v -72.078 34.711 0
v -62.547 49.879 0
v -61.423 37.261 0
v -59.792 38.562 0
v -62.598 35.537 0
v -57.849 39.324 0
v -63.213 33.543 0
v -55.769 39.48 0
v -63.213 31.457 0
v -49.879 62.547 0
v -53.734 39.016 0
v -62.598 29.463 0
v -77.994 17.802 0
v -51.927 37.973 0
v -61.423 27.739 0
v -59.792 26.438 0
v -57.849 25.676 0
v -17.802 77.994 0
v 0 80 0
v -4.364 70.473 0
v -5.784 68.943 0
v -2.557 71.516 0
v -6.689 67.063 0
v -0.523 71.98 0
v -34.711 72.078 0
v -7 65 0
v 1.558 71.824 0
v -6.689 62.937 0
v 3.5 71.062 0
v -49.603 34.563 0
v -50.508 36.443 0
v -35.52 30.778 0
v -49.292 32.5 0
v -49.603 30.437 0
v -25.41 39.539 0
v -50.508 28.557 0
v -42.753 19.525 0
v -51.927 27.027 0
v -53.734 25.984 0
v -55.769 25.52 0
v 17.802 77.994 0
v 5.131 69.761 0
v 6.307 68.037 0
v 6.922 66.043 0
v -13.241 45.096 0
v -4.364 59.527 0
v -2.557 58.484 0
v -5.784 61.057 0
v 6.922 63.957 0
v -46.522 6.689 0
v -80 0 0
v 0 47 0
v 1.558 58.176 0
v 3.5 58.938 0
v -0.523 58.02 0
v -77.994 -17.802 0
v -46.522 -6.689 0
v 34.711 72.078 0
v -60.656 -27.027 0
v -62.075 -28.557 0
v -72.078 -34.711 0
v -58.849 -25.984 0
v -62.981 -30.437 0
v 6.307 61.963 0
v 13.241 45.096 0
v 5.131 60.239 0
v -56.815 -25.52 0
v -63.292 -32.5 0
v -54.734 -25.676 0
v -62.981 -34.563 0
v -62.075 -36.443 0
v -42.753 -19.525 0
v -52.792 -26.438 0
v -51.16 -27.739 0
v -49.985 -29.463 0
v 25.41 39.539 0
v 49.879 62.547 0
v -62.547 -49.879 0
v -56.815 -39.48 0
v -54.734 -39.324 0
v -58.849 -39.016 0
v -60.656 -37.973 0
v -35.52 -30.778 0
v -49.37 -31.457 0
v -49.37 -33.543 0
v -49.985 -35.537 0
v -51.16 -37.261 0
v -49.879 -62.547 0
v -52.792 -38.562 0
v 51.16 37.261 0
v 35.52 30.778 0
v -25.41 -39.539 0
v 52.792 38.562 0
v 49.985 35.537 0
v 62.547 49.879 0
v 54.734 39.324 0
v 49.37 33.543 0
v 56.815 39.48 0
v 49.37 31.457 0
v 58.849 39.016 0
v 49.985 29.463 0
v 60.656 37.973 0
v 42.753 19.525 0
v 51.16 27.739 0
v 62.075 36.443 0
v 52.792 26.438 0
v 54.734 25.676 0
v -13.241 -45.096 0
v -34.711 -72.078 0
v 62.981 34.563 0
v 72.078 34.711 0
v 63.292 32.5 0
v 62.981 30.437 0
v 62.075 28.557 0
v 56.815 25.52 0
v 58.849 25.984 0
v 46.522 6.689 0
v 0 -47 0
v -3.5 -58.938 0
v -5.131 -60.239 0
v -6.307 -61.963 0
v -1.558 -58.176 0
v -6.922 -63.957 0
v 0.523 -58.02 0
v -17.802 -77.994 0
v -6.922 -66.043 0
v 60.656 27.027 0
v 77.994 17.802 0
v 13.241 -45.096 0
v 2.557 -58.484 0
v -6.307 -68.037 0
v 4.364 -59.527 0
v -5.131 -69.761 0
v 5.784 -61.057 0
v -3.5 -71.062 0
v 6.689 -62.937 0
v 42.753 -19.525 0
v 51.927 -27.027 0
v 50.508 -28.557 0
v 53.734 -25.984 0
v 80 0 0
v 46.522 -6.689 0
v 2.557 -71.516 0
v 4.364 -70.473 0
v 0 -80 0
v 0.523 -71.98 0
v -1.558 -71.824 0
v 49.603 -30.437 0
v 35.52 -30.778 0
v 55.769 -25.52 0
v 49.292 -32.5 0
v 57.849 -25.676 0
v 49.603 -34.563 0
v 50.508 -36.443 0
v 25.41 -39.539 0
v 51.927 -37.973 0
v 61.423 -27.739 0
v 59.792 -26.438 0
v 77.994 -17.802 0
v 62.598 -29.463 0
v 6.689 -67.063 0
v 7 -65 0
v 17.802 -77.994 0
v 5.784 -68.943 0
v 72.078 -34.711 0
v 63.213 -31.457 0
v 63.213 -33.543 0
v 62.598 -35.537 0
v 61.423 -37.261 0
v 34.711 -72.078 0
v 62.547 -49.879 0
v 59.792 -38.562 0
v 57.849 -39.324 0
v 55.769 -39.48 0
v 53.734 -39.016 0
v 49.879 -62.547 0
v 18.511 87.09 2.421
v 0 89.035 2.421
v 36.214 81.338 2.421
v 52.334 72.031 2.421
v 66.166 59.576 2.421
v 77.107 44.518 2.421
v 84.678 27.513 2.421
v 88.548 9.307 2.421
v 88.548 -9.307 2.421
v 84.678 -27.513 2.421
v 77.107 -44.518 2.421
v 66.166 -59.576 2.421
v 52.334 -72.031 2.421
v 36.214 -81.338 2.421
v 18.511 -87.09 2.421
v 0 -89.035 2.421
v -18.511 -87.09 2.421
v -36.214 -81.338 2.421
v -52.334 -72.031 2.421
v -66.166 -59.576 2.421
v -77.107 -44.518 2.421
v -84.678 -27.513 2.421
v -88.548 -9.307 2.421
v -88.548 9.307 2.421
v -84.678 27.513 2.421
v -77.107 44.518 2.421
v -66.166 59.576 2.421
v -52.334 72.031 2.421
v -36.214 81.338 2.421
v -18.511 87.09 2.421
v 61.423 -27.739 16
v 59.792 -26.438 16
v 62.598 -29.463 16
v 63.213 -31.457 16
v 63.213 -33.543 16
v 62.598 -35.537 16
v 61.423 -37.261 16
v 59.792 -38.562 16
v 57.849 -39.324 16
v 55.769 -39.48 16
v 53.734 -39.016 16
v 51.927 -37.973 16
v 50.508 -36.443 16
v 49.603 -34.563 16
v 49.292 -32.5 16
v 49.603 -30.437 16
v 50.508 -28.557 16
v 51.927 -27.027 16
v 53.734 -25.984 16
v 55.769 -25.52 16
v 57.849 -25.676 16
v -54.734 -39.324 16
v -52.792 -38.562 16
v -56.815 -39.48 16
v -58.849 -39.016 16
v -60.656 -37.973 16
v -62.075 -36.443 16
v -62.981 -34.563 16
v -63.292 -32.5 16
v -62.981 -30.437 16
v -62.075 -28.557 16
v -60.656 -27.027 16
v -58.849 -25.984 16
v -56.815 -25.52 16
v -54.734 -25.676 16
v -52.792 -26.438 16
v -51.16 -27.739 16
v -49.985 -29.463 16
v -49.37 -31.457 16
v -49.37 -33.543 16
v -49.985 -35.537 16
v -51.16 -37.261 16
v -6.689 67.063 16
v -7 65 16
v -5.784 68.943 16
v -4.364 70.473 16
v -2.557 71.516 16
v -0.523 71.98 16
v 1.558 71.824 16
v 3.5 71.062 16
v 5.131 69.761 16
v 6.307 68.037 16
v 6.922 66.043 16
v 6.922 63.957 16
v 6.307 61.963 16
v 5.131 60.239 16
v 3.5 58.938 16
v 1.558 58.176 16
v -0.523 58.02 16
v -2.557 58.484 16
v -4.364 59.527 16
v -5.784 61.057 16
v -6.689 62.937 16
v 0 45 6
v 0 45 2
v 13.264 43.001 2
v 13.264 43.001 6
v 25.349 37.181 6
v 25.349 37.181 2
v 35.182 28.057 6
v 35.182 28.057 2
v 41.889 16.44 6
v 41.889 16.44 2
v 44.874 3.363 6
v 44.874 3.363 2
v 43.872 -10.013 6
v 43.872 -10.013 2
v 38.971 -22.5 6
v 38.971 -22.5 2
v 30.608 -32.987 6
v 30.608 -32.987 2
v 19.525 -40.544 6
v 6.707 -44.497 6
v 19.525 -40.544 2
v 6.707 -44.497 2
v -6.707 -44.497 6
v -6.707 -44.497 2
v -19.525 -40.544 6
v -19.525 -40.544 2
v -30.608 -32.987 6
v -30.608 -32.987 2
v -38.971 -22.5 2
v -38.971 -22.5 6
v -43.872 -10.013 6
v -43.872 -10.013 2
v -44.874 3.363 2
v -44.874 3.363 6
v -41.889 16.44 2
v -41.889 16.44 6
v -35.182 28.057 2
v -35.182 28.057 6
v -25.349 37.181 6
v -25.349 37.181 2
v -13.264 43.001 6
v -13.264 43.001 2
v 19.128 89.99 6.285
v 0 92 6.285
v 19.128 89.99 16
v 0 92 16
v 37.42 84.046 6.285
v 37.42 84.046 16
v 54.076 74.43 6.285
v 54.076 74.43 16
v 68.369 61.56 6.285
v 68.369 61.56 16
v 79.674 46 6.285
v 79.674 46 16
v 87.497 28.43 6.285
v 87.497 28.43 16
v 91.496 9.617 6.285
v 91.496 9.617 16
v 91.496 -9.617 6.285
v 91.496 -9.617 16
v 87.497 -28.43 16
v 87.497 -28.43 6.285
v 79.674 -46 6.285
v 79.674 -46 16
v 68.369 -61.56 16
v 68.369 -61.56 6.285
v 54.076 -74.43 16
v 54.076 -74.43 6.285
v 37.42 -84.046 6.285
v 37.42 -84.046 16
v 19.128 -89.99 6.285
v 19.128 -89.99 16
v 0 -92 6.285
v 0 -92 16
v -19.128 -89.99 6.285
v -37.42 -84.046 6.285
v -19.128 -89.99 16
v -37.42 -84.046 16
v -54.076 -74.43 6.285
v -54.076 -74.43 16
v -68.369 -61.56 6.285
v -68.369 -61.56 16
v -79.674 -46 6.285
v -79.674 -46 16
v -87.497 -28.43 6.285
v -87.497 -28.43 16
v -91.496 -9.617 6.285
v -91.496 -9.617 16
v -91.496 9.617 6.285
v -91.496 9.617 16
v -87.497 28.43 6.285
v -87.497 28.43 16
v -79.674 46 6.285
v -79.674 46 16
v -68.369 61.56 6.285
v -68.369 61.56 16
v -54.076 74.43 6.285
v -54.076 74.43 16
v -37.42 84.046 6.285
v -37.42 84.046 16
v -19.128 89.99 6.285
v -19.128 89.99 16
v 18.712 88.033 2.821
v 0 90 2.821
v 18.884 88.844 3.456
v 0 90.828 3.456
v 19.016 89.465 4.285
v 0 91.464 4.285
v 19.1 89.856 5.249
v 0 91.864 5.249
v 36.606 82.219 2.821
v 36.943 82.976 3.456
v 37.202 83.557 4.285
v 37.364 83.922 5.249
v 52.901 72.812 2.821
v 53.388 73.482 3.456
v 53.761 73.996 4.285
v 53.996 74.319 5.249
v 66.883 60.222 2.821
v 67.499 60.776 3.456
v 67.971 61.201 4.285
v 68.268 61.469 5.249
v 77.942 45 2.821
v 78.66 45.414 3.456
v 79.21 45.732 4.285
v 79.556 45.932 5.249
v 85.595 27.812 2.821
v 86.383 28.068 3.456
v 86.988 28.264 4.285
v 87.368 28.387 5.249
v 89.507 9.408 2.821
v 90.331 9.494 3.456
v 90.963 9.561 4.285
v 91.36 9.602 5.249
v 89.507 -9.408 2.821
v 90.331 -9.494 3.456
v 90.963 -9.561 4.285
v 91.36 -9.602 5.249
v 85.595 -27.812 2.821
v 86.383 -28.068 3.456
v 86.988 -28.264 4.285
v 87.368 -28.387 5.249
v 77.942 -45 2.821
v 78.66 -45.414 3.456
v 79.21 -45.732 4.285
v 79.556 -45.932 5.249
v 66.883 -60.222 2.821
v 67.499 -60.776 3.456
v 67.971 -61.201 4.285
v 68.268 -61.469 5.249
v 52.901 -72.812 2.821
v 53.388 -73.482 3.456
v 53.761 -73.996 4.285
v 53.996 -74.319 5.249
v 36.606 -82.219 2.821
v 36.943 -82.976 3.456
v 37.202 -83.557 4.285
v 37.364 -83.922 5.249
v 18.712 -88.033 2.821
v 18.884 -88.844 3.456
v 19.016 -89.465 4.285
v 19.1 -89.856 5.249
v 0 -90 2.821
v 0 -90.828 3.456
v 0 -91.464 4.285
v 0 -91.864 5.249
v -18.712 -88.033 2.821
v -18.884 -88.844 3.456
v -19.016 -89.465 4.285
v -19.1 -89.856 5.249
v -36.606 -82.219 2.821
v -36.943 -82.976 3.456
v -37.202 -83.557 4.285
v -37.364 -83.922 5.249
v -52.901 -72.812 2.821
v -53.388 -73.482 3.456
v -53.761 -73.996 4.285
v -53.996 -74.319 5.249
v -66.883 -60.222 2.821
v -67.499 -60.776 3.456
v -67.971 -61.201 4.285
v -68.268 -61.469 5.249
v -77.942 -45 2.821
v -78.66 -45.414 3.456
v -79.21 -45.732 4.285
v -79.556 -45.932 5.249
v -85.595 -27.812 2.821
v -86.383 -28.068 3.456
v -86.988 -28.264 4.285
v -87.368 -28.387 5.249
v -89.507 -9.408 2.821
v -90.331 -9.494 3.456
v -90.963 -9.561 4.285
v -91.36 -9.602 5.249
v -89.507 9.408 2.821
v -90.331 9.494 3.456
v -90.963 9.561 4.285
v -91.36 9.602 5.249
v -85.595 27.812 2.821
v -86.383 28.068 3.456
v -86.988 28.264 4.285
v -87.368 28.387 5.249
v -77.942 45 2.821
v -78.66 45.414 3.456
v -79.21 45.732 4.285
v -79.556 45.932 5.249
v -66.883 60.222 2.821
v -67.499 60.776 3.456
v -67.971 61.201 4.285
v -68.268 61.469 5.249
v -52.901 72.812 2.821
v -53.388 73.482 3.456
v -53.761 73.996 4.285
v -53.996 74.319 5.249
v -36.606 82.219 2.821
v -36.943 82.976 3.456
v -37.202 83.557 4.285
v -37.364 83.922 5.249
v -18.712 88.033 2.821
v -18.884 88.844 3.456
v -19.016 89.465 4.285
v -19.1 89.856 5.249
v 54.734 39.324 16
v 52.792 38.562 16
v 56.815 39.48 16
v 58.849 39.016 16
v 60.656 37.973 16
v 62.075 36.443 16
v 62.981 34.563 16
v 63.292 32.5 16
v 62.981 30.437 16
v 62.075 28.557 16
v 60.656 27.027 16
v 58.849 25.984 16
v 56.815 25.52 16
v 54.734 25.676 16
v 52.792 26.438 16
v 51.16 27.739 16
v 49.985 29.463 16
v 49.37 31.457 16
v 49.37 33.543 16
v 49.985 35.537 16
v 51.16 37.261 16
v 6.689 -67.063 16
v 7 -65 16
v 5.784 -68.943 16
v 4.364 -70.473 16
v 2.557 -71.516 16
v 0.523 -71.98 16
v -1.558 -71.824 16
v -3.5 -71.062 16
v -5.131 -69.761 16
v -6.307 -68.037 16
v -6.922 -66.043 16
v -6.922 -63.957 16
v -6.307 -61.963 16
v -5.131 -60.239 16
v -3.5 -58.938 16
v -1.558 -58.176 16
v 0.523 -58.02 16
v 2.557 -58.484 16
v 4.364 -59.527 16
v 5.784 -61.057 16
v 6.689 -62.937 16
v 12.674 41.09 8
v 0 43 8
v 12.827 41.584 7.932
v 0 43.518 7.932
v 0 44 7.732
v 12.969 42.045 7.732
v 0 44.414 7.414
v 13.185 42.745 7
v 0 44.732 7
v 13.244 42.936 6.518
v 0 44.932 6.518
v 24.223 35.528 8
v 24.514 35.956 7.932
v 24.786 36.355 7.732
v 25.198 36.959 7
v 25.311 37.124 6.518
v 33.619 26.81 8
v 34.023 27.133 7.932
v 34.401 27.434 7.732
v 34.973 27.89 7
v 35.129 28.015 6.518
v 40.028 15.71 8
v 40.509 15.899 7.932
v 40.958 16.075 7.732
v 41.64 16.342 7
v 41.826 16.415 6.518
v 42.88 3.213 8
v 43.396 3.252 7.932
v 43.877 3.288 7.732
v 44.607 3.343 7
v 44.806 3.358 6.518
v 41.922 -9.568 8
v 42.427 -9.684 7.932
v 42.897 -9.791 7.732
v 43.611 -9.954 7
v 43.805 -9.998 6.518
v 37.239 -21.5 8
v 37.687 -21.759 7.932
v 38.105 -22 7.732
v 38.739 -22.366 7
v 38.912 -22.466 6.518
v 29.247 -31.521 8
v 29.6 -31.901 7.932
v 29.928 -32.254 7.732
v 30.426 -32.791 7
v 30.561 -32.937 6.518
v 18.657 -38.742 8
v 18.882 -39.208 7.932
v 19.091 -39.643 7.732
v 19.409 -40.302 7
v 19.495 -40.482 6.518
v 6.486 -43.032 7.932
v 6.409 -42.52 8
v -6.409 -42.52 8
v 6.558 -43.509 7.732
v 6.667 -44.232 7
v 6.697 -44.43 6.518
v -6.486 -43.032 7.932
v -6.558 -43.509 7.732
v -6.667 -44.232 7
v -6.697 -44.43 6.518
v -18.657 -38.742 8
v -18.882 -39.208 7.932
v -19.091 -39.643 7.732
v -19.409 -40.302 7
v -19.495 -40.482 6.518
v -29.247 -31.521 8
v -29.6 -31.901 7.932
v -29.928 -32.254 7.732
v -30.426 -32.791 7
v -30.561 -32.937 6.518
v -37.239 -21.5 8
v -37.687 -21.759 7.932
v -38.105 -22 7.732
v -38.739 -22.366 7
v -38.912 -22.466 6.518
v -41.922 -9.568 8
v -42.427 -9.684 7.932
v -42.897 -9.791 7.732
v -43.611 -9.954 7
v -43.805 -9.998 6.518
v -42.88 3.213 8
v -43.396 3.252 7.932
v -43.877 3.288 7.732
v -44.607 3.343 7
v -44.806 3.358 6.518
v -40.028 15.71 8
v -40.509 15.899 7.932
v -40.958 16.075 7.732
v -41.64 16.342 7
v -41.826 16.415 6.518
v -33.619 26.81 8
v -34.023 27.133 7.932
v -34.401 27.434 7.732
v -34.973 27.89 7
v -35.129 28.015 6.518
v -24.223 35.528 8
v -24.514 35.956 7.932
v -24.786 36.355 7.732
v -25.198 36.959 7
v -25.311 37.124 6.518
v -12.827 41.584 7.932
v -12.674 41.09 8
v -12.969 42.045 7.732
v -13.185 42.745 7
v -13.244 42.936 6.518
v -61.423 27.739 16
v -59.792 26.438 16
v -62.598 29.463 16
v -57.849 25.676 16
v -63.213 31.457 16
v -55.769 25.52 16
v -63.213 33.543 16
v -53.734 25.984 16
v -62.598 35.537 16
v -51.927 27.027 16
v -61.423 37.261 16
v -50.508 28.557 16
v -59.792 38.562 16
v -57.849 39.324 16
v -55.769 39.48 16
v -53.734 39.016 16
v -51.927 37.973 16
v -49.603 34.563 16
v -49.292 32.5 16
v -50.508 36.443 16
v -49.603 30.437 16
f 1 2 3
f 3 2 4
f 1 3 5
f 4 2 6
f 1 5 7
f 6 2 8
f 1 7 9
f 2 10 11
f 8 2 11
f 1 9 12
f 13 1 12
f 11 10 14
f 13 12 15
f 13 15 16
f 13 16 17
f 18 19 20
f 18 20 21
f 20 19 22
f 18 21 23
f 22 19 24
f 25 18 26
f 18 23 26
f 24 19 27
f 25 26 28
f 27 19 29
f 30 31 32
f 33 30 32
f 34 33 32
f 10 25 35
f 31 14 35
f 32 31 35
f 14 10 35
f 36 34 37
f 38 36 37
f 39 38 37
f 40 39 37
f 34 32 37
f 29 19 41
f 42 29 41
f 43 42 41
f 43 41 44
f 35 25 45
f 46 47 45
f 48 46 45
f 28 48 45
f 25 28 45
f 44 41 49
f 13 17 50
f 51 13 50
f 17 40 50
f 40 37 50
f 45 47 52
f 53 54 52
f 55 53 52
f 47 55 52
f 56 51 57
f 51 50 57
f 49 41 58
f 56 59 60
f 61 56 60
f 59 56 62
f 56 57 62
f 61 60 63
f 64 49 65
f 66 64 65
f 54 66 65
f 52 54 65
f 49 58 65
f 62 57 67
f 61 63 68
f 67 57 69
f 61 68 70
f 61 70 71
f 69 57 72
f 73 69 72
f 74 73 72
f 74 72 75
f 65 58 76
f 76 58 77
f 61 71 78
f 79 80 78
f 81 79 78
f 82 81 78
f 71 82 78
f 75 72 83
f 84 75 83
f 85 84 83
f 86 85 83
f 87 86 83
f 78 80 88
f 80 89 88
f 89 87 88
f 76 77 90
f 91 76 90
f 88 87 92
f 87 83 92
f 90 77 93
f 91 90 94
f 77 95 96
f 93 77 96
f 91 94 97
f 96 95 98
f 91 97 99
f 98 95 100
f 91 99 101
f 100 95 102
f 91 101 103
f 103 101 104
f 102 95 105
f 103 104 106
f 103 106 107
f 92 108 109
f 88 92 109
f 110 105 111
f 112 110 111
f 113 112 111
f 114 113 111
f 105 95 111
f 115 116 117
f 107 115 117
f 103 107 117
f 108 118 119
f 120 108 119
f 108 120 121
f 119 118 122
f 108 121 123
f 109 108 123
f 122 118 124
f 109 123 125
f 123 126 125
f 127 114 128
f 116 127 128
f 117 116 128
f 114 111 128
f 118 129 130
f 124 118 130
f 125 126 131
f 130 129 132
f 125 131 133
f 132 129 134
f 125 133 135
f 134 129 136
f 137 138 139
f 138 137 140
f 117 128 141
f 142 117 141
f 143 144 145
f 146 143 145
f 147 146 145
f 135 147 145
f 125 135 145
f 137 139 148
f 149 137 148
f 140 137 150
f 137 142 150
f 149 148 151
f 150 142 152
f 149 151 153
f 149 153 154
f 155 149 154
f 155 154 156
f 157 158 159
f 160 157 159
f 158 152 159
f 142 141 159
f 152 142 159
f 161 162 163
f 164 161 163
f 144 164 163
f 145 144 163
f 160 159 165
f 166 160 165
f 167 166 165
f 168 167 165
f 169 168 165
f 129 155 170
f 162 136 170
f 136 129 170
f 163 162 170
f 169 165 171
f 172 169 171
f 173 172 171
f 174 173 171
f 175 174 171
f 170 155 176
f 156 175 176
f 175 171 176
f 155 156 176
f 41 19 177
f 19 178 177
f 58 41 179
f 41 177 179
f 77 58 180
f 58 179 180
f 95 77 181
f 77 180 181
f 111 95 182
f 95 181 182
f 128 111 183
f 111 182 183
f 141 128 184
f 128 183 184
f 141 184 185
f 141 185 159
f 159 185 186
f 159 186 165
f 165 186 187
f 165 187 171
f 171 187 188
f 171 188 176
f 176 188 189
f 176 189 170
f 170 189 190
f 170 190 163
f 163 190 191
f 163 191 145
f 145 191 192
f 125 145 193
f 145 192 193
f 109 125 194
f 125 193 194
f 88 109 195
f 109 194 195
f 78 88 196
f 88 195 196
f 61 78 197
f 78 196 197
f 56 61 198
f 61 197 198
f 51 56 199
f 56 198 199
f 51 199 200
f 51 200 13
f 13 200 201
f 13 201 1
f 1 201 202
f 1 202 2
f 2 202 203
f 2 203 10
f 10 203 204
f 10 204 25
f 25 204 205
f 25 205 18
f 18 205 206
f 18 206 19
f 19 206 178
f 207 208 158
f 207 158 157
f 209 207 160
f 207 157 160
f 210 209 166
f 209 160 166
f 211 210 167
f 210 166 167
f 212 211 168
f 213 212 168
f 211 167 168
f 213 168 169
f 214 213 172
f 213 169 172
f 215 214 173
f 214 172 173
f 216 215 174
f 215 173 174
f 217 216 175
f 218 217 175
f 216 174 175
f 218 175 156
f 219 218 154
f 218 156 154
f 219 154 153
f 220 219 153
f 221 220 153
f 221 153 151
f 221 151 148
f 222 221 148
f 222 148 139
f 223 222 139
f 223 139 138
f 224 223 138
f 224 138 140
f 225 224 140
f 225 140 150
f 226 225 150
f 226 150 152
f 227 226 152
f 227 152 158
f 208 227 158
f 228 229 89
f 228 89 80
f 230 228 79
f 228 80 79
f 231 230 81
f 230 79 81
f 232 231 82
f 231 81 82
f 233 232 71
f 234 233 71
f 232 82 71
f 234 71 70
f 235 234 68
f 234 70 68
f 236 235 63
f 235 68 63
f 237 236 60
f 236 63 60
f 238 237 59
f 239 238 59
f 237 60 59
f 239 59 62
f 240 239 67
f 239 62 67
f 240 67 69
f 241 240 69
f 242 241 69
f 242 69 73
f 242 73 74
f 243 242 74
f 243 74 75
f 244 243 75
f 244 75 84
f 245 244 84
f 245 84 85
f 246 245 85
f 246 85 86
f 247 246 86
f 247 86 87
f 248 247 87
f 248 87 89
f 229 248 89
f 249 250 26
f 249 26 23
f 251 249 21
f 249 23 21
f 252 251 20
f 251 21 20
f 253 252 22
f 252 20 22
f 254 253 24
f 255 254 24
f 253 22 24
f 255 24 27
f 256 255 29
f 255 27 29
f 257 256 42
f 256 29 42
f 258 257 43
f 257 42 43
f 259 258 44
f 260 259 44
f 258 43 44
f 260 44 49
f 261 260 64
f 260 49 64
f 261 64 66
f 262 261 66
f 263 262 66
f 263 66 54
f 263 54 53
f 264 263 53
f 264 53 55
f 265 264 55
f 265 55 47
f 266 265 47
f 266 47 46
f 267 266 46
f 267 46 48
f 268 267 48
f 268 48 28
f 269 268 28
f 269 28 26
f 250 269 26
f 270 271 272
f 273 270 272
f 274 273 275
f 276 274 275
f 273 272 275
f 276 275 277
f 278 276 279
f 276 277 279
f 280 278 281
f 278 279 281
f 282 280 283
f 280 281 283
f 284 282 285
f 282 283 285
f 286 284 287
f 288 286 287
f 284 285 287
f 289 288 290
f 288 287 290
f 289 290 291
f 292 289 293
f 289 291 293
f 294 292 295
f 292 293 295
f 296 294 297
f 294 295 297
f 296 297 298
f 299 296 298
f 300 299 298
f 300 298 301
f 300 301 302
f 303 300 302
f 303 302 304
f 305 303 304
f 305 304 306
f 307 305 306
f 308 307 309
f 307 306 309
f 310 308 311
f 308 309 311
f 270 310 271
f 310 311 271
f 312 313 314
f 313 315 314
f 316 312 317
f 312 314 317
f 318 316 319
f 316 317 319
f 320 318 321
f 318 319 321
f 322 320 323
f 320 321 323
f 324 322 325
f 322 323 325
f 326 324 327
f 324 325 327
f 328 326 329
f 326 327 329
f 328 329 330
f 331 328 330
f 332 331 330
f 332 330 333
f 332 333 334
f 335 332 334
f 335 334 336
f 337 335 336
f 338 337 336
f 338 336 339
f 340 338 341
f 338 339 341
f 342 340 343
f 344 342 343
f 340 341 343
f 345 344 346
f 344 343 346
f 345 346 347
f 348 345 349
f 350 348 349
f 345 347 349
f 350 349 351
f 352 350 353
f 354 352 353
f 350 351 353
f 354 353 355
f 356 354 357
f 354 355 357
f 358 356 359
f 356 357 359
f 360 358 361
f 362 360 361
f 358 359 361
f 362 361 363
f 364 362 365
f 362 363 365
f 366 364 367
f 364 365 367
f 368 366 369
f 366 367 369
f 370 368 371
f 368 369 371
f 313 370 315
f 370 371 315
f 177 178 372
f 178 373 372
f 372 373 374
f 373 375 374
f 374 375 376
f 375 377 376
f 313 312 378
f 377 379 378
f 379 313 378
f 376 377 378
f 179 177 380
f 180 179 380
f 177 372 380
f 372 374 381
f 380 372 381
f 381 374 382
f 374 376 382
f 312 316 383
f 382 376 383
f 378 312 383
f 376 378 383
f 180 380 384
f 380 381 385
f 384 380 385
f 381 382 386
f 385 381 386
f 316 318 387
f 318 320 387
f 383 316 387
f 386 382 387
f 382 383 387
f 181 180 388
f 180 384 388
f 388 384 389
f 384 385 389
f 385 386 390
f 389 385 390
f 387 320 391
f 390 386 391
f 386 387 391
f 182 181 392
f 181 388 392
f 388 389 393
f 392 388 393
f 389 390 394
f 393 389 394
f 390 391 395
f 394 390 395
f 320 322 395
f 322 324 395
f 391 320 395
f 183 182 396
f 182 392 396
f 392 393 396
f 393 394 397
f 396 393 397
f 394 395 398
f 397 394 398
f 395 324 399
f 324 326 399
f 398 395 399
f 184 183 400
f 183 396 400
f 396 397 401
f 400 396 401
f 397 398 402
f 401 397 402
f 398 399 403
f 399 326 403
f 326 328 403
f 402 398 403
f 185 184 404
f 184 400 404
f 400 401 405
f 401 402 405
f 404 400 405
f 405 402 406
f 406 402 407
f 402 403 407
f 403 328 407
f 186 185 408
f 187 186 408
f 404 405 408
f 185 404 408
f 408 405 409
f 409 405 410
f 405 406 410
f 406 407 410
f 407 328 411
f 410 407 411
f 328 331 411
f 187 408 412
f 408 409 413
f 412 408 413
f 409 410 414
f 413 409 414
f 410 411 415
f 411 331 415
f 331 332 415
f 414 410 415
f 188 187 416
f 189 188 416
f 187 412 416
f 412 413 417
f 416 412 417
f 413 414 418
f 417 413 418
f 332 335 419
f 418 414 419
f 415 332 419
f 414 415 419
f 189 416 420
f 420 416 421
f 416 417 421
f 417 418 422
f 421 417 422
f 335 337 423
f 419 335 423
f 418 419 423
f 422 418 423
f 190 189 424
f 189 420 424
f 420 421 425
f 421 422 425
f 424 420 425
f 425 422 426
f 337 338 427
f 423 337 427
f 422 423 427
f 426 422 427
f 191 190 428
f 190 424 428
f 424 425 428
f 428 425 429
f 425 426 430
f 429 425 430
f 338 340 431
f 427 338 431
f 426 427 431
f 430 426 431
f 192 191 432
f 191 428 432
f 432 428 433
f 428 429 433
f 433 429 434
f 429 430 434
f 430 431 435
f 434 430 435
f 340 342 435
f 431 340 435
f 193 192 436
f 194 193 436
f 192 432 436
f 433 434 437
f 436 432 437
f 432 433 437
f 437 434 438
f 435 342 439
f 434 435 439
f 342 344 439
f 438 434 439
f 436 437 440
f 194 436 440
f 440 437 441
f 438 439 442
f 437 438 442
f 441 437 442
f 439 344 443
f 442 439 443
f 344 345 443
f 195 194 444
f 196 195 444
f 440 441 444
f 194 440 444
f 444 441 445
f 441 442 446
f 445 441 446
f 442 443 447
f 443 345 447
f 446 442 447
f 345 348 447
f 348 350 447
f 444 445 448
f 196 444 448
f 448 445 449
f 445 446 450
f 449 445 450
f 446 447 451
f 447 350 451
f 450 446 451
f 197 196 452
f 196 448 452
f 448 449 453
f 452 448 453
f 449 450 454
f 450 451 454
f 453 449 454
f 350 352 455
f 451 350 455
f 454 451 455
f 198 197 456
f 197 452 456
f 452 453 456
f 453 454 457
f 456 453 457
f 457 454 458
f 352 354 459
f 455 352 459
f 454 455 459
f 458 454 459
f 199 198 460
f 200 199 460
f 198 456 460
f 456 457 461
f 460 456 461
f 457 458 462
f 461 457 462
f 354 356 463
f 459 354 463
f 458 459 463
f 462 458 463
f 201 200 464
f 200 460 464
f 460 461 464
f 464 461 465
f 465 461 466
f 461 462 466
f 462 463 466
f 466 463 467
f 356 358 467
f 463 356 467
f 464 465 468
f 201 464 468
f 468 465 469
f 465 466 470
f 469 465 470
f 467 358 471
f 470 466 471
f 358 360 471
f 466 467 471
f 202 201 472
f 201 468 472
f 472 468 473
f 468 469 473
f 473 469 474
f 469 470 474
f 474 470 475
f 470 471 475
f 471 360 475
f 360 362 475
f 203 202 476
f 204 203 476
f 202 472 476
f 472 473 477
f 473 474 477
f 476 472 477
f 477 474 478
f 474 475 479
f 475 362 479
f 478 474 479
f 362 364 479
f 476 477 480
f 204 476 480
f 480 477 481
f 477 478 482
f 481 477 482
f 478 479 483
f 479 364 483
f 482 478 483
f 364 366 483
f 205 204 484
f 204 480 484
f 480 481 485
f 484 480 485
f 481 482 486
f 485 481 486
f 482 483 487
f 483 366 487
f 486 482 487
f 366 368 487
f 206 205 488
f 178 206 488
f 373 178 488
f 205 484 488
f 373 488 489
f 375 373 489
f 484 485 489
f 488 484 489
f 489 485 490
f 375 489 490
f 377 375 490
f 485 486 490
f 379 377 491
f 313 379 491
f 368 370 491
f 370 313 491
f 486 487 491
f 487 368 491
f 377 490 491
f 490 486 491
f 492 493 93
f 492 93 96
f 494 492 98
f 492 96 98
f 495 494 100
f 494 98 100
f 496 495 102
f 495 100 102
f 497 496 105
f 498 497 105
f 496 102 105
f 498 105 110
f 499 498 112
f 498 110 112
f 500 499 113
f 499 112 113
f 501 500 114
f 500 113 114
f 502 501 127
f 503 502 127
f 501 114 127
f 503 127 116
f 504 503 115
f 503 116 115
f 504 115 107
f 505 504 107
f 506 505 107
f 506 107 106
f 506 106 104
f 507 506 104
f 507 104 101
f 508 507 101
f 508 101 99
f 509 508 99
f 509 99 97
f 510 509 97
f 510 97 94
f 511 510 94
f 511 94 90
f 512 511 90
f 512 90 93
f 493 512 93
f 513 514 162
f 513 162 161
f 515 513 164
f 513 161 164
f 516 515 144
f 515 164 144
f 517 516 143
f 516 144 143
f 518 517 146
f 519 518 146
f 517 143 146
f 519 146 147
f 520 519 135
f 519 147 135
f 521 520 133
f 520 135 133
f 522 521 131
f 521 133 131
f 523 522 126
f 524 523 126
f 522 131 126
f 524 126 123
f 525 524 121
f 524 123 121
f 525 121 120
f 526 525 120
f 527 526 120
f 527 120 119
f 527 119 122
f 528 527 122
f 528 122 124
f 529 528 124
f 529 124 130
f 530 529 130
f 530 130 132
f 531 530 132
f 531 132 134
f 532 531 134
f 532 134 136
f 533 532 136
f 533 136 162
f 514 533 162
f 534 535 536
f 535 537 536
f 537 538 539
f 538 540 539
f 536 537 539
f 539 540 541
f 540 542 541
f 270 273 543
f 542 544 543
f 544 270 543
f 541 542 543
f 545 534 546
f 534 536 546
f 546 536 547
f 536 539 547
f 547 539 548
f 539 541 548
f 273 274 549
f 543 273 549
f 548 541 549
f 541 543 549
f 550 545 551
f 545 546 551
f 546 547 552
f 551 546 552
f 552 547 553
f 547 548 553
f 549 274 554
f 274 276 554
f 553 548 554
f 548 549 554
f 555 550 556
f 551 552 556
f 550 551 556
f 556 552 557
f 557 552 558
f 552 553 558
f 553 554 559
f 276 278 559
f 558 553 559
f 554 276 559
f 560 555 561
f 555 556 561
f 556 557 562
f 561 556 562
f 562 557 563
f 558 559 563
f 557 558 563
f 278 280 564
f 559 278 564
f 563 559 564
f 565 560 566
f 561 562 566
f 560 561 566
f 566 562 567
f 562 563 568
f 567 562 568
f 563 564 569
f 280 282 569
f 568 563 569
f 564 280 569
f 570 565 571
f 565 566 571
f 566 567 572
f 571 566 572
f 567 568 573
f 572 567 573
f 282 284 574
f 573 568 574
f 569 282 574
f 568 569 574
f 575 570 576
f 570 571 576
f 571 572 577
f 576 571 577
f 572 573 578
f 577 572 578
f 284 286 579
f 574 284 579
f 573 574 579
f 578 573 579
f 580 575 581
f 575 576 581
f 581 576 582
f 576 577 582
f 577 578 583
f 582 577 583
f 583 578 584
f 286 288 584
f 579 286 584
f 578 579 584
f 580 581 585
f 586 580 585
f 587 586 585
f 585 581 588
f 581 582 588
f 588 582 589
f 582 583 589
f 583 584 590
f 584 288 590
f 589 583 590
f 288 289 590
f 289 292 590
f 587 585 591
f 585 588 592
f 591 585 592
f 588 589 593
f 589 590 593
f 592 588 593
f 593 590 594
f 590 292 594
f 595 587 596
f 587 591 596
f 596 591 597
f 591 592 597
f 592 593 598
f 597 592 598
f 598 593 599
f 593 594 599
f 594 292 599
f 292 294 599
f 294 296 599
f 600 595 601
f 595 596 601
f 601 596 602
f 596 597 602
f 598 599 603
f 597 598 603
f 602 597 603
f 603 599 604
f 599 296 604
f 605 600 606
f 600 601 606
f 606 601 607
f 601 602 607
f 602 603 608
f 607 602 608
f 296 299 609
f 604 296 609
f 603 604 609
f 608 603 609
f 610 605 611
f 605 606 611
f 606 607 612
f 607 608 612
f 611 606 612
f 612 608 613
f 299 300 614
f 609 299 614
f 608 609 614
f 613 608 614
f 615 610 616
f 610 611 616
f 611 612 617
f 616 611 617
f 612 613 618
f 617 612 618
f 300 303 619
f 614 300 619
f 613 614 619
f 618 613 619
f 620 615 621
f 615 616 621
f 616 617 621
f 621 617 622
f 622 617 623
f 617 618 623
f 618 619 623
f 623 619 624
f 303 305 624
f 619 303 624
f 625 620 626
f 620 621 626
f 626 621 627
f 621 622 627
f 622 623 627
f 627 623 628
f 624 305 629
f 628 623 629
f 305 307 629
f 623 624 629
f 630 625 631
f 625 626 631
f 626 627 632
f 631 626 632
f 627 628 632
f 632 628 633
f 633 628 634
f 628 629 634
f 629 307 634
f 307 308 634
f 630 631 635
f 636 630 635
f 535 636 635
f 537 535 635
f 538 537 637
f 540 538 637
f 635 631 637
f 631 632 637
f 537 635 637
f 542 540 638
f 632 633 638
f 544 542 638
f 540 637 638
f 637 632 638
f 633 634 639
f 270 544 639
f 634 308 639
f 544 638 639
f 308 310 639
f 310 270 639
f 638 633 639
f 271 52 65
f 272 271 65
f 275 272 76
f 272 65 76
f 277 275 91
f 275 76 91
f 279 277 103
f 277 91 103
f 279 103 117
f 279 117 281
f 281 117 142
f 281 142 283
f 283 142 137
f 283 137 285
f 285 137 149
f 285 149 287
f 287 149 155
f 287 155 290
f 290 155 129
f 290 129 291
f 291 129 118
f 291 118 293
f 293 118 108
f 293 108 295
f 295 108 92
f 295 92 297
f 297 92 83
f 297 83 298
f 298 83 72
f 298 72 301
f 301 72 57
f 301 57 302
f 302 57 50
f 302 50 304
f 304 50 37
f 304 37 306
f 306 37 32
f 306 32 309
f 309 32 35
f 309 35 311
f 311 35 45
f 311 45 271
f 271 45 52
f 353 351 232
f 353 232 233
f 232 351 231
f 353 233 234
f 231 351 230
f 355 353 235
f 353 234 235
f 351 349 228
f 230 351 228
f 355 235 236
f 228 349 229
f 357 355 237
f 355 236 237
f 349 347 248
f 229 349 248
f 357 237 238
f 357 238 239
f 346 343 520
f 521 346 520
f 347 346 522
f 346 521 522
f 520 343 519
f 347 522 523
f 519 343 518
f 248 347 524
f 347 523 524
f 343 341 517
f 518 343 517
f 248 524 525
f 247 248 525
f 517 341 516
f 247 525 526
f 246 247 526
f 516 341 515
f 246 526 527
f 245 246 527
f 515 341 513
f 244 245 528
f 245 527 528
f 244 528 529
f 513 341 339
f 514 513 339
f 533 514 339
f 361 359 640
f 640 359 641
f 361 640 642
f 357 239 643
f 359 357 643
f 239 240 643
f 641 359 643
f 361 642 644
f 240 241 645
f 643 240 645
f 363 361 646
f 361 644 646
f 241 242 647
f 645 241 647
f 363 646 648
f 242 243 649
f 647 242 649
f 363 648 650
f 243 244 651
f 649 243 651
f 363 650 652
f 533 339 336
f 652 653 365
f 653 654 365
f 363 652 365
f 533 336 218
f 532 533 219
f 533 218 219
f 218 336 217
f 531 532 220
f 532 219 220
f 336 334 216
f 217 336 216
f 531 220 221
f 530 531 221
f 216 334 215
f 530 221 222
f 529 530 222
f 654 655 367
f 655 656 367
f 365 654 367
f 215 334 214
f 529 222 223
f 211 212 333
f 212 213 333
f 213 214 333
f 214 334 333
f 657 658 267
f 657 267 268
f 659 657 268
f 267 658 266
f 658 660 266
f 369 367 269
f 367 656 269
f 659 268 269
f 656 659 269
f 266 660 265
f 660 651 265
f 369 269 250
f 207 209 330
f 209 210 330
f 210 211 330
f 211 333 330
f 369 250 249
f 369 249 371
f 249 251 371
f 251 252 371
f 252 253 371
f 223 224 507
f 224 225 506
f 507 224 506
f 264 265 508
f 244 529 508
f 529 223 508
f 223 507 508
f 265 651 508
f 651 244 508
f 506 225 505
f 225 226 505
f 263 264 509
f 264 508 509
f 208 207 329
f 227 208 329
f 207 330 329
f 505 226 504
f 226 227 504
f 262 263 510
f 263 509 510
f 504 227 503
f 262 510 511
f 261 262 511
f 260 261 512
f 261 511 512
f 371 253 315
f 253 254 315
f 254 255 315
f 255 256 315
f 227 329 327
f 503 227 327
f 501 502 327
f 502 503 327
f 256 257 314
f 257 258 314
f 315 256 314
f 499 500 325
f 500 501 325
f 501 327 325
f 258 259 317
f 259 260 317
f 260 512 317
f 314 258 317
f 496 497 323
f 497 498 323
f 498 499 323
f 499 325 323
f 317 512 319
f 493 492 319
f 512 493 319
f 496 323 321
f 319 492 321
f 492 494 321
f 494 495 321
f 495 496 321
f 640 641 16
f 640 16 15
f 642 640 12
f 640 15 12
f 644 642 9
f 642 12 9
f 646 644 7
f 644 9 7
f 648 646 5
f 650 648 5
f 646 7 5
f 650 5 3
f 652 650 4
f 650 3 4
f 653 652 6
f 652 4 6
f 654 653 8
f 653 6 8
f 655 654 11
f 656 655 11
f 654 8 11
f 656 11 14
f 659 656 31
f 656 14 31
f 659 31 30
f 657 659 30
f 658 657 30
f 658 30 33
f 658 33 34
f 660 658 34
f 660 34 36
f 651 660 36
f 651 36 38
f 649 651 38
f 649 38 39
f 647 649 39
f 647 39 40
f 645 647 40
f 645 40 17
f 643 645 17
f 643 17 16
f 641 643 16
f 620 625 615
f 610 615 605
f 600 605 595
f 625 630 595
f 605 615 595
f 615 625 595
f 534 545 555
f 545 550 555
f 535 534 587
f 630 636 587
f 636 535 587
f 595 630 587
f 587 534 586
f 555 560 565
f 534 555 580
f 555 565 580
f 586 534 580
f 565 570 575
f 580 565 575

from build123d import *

# Parameters (mm, degrees)
F2_SIZE2        = 2
F2_SIZE         = 2
F3_R            = 7
F4_DEPTH        = 25
F4_COPIES_COUNT = 6


# Not quite as in the source:
# - a pattern or mirror of a feature is missing from the dataset's text; its kind, count and spacing are read off the source's solid


with BuildPart() as f1:
    # F0 (on Right) → F1 (revolve)
    with BuildSketch(Plane.YZ):
        with BuildLine():
            Line((92, 16), (0, 16))
            Line((0, 16), (0, 8))
            Line((0, 8), (43, 8))
            ThreePointArc((43, 8), (44.4142135624, 7.4142135624), (45, 6))
            Line((45, 6), (45, 0))
            Line((45, 0), (80, 0))
            Line((80, 0), (89.0352761804, 2.4209949559))
            ThreePointArc((89.0352761804, 2.4209949559), (91.1734133612, 3.8496525451), (92, 6.2846982611))
            Line((92, 6.2846982611), (92, 16))
        make_face()
    revolve(axis=Axis((0, 0, 0.8759116049), (0, 0, -1)))

    # F2
    f2_edges = [f1.edges().sort_by_distance(p)[0] for p in [
        (0, -45, 0),
    ]]
    chamfer(f2_edges, length=F2_SIZE, length2=F2_SIZE2)

    # F3 (on face) → F4 (cut)
    with BuildSketch(Plane(origin=(0, 0, 0), x_dir=(1, 0, 0), z_dir=(0, 0, -1))):
        with Locations((0, 65)):
            Circle(F3_R)
    f4 = extrude(amount=-F4_DEPTH, mode=Mode.SUBTRACT)

    # F4_copies: F4 ×6 about axis
    f4_copies_axis = Axis((0, 0, 0), (0, 0, 1))
    for i in range(1, F4_COPIES_COUNT):
        add(f4.rotate(f4_copies_axis, i * 360 / F4_COPIES_COUNT), mode=Mode.SUBTRACT)


solid = f1.part
